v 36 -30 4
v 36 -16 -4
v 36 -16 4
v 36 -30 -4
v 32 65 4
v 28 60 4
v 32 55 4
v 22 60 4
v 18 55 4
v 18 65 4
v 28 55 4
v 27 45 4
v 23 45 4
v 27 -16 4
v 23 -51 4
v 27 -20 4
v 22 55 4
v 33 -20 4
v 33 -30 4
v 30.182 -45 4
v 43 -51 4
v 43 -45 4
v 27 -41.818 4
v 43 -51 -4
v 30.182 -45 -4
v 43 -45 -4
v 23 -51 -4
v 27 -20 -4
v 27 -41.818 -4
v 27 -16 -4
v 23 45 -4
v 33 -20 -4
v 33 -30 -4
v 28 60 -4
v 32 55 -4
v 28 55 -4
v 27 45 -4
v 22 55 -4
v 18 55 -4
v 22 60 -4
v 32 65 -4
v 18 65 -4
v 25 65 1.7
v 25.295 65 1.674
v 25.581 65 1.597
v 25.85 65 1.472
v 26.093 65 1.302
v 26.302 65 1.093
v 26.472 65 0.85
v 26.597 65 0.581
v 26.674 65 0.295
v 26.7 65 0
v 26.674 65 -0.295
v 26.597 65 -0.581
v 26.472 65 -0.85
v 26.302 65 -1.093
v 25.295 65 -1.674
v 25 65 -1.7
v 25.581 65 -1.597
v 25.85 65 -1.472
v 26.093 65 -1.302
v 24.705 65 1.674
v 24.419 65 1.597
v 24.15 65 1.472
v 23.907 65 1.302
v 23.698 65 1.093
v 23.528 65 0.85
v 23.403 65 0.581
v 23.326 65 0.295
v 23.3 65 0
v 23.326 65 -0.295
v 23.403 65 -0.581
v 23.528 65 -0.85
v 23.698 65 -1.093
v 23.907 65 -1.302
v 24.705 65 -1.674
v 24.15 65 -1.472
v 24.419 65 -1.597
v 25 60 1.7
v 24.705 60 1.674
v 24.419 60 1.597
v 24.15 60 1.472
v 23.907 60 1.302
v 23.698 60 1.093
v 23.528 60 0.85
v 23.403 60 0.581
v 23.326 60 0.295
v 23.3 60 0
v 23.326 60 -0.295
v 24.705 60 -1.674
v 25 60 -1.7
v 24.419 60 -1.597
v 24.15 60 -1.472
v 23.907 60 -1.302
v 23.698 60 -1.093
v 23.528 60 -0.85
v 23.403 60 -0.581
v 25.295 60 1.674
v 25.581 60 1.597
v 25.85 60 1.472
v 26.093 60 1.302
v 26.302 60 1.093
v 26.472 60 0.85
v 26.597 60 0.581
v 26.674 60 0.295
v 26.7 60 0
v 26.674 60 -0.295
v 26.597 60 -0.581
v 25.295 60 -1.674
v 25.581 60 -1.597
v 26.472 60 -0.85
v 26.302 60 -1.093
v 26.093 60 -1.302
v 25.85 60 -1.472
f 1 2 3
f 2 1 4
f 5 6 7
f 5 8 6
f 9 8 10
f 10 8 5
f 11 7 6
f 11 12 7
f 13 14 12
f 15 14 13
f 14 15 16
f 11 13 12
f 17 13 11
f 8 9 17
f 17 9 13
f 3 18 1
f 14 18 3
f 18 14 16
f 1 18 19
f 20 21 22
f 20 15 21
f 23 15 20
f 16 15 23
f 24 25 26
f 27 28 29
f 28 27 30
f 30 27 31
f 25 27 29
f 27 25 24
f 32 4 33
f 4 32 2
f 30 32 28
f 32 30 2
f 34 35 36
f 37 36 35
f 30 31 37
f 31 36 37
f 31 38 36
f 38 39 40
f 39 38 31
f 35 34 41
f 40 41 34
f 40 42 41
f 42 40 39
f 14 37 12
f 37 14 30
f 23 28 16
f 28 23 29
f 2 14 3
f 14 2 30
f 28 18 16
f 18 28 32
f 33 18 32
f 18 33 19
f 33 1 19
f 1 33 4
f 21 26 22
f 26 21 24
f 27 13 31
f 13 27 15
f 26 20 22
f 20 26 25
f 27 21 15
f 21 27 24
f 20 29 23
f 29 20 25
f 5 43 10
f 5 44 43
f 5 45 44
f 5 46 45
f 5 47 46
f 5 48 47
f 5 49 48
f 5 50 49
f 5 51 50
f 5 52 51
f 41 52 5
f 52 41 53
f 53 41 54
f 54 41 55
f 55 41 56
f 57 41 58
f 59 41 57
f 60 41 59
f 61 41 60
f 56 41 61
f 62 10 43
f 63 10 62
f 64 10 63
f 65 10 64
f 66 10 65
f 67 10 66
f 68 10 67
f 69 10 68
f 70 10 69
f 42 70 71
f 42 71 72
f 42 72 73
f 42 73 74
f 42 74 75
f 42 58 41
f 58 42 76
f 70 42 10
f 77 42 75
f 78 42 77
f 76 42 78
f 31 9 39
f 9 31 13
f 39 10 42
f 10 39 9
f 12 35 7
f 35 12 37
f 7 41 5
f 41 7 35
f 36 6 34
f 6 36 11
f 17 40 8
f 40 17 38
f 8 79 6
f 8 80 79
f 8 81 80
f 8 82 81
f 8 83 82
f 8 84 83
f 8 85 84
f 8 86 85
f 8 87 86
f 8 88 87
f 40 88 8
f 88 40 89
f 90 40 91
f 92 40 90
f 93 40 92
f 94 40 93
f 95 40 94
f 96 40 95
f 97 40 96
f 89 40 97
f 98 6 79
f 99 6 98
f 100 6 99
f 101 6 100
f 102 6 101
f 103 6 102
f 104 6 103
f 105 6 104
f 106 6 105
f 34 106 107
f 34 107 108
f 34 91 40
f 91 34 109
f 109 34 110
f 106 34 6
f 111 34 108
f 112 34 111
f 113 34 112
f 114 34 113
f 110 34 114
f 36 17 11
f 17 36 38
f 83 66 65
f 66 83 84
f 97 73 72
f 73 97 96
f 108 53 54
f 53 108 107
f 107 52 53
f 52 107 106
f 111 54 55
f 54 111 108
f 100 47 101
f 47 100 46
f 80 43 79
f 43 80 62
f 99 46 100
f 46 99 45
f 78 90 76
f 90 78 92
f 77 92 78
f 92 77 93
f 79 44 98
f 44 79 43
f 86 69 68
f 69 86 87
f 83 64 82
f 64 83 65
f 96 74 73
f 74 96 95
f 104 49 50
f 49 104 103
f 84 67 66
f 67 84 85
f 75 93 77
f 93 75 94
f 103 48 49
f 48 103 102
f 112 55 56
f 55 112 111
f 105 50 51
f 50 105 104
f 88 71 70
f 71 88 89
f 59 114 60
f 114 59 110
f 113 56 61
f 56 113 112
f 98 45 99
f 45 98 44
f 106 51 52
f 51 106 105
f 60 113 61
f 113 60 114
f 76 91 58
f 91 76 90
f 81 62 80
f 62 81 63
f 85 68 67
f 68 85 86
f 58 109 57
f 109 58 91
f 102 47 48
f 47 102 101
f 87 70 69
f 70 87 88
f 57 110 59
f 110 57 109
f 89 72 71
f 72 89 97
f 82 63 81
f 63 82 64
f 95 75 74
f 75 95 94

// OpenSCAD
include <../../lib/relativity.scad/relativity.scad>

length = 90;
$fn=36;

module A() {
  differed("hole", "not(hole)") {
    box([42, 10, 1.5], anchor=bottom);
    box([42, 4, 2], anchor=bottom, $class="hole");
  }
  translated(25*x, n=[-1,1]) differed("hole", "not(hole)") {
    box([8, 10, 1.5], anchor=bottom)
      align(-z) box([$parent_size.x, 4, 4], anchor=-z);
    rod(d=3.3, h=10, anchor=bottom, $class="hole");
  }  
  box([6, 4, 4], anchor=bottom);
}

module B() {
  mirrored(x)
    box([69, 4, 2], anchor=bottom)
    align(x-y) box([5, 8, $parent_size.z], anchor=x+y)
    translated(-9*x) align(-x) box([5, $parent_size.y, $parent_size.z], anchor=x);
  box([41, 2, 4], anchor=bottom);
}

module C(bucket_position) {
  differed("hole", "not(hole)")
  box([4, length, 8]) {
    align(x-y) translated(bucket_position*y) color("blue") box([9, 4, $parent_size.z], anchor=-x-y)
      align(x-y) box([3, 10, $parent_size.z], anchor=x+y);
    align(-x-y) color("red") box([20, 6, $parent_size.z], anchor=-x+y);
    align(x-y) rotated(45*z) box([4.5, 4.5, $parent_size.z], anchor=center);
    hulled("not(hole)")
      align(y) box([$parent_size.x, 10, $parent_size.z], anchor=-y)
        align(y) box([14, 10, $parent_size.z], anchor=-y)
          align(-y) box([6, 5, $parent_size.z], anchor=center, anchor=-y, $class="hole")
            align(y) orient(y) rod(d=3.4, h=10, anchor=bottom);
  }
}

// A();
// translated(5*y+5*z) B();
// C(35);  // rear
translated(25*x) C(25);  // front
